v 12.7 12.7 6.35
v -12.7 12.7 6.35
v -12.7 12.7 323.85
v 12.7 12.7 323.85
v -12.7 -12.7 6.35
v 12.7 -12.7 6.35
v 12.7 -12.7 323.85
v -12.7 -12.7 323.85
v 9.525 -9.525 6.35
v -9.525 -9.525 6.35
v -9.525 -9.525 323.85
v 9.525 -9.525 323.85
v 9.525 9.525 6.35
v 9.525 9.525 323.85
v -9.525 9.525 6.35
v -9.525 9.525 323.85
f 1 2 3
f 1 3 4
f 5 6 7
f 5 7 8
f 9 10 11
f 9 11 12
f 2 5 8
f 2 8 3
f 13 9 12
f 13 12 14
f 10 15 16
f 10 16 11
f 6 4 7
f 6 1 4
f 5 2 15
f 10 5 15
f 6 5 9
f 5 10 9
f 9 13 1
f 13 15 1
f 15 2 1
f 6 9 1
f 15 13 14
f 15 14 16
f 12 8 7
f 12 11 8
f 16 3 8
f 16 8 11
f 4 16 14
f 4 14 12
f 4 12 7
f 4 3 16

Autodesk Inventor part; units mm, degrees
ref_plane "Start Plane" through (0, 0, 6.35) normal (0, 0, 1) x (1, 0, 0)
ref_plane "End Plane" through (0, 0, 323.85) normal (0, 0, 1) x (1, 0, 0)
sketch "Sketch" plane through (0, 0, 0) normal (0, 0, 1) x (1, 0, 0)
  line L0 (-12.7, 12.7) -> (12.7, 12.7)
  line L1 (12.7, 12.7) -> (12.7, -12.7)
  line L2 (12.7, -12.7) -> (-12.7, -12.7)
  line L3 (-12.7, -12.7) -> (-12.7, 12.7)
  line L4 (9.525, 9.525) -> (-9.525, 9.525)
  line L5 (-9.525, 9.525) -> (-9.525, -9.525)
  line L6 (-9.525, -9.525) -> (9.525, -9.525)
  line L7 (9.525, -9.525) -> (9.525, 9.525)
  point P0 (0, 0)
  point P1 (0, 12.7)
  point P2 (-12.7, 0)
  dimension "width" = 25.4
  dimension "d1" = 3.175
extrude "Body" add sketch "Sketch" along normal up to surface (317.5 mm away) from surface at 6.35
sketch "Sketch4" plane through (0, 0, 0) normal (0, 0, 1) x (1, 0, 0)
  line L0 (0, 0) -> (10, 0)
ref_plane "Work Plane4" through (0, 0, 0) normal (0, -1, 0) x (1, 0, 0)
sketch "Sketch5" plane through (0, 0, 0) normal (0, -1, 0) x (1, 0, 0)
  line L0 (-2, 6.35) -> (12, 6.35)
  line L1 (-2, 323.85) -> (12, 323.85)
  dimension "d9" = 317.5
ref_plane "Work Plane5" through (-723.9, -555.6504, 6.35) normal (0, 0, -1) x (-1, 0, 0)
split "Split1" plane through (-723.9, -555.6504, 6.35) removes the side toward (0, 0, -1)
ref_plane "Work Plane6" through (-31.75, 631.7996, 323.85) normal (0, 0, 1) x (1, 0, 0)
split "Split2" plane through (-31.75, 631.7996, 323.85) removes the side toward (0, 0, 1)
equation "\"G_OFFSET_START\" = -6.35"
equation "\"G_OFFSET_END\" = 19.05"
equation "\"d4\" = -G_OFFSET_START"
equation "\"d5\" = length + G_OFFSET_END"
equation "\"G_L\" = 304.8"
equation "\"length\" = 304.8"
properties part number "Square Tube Profile"
